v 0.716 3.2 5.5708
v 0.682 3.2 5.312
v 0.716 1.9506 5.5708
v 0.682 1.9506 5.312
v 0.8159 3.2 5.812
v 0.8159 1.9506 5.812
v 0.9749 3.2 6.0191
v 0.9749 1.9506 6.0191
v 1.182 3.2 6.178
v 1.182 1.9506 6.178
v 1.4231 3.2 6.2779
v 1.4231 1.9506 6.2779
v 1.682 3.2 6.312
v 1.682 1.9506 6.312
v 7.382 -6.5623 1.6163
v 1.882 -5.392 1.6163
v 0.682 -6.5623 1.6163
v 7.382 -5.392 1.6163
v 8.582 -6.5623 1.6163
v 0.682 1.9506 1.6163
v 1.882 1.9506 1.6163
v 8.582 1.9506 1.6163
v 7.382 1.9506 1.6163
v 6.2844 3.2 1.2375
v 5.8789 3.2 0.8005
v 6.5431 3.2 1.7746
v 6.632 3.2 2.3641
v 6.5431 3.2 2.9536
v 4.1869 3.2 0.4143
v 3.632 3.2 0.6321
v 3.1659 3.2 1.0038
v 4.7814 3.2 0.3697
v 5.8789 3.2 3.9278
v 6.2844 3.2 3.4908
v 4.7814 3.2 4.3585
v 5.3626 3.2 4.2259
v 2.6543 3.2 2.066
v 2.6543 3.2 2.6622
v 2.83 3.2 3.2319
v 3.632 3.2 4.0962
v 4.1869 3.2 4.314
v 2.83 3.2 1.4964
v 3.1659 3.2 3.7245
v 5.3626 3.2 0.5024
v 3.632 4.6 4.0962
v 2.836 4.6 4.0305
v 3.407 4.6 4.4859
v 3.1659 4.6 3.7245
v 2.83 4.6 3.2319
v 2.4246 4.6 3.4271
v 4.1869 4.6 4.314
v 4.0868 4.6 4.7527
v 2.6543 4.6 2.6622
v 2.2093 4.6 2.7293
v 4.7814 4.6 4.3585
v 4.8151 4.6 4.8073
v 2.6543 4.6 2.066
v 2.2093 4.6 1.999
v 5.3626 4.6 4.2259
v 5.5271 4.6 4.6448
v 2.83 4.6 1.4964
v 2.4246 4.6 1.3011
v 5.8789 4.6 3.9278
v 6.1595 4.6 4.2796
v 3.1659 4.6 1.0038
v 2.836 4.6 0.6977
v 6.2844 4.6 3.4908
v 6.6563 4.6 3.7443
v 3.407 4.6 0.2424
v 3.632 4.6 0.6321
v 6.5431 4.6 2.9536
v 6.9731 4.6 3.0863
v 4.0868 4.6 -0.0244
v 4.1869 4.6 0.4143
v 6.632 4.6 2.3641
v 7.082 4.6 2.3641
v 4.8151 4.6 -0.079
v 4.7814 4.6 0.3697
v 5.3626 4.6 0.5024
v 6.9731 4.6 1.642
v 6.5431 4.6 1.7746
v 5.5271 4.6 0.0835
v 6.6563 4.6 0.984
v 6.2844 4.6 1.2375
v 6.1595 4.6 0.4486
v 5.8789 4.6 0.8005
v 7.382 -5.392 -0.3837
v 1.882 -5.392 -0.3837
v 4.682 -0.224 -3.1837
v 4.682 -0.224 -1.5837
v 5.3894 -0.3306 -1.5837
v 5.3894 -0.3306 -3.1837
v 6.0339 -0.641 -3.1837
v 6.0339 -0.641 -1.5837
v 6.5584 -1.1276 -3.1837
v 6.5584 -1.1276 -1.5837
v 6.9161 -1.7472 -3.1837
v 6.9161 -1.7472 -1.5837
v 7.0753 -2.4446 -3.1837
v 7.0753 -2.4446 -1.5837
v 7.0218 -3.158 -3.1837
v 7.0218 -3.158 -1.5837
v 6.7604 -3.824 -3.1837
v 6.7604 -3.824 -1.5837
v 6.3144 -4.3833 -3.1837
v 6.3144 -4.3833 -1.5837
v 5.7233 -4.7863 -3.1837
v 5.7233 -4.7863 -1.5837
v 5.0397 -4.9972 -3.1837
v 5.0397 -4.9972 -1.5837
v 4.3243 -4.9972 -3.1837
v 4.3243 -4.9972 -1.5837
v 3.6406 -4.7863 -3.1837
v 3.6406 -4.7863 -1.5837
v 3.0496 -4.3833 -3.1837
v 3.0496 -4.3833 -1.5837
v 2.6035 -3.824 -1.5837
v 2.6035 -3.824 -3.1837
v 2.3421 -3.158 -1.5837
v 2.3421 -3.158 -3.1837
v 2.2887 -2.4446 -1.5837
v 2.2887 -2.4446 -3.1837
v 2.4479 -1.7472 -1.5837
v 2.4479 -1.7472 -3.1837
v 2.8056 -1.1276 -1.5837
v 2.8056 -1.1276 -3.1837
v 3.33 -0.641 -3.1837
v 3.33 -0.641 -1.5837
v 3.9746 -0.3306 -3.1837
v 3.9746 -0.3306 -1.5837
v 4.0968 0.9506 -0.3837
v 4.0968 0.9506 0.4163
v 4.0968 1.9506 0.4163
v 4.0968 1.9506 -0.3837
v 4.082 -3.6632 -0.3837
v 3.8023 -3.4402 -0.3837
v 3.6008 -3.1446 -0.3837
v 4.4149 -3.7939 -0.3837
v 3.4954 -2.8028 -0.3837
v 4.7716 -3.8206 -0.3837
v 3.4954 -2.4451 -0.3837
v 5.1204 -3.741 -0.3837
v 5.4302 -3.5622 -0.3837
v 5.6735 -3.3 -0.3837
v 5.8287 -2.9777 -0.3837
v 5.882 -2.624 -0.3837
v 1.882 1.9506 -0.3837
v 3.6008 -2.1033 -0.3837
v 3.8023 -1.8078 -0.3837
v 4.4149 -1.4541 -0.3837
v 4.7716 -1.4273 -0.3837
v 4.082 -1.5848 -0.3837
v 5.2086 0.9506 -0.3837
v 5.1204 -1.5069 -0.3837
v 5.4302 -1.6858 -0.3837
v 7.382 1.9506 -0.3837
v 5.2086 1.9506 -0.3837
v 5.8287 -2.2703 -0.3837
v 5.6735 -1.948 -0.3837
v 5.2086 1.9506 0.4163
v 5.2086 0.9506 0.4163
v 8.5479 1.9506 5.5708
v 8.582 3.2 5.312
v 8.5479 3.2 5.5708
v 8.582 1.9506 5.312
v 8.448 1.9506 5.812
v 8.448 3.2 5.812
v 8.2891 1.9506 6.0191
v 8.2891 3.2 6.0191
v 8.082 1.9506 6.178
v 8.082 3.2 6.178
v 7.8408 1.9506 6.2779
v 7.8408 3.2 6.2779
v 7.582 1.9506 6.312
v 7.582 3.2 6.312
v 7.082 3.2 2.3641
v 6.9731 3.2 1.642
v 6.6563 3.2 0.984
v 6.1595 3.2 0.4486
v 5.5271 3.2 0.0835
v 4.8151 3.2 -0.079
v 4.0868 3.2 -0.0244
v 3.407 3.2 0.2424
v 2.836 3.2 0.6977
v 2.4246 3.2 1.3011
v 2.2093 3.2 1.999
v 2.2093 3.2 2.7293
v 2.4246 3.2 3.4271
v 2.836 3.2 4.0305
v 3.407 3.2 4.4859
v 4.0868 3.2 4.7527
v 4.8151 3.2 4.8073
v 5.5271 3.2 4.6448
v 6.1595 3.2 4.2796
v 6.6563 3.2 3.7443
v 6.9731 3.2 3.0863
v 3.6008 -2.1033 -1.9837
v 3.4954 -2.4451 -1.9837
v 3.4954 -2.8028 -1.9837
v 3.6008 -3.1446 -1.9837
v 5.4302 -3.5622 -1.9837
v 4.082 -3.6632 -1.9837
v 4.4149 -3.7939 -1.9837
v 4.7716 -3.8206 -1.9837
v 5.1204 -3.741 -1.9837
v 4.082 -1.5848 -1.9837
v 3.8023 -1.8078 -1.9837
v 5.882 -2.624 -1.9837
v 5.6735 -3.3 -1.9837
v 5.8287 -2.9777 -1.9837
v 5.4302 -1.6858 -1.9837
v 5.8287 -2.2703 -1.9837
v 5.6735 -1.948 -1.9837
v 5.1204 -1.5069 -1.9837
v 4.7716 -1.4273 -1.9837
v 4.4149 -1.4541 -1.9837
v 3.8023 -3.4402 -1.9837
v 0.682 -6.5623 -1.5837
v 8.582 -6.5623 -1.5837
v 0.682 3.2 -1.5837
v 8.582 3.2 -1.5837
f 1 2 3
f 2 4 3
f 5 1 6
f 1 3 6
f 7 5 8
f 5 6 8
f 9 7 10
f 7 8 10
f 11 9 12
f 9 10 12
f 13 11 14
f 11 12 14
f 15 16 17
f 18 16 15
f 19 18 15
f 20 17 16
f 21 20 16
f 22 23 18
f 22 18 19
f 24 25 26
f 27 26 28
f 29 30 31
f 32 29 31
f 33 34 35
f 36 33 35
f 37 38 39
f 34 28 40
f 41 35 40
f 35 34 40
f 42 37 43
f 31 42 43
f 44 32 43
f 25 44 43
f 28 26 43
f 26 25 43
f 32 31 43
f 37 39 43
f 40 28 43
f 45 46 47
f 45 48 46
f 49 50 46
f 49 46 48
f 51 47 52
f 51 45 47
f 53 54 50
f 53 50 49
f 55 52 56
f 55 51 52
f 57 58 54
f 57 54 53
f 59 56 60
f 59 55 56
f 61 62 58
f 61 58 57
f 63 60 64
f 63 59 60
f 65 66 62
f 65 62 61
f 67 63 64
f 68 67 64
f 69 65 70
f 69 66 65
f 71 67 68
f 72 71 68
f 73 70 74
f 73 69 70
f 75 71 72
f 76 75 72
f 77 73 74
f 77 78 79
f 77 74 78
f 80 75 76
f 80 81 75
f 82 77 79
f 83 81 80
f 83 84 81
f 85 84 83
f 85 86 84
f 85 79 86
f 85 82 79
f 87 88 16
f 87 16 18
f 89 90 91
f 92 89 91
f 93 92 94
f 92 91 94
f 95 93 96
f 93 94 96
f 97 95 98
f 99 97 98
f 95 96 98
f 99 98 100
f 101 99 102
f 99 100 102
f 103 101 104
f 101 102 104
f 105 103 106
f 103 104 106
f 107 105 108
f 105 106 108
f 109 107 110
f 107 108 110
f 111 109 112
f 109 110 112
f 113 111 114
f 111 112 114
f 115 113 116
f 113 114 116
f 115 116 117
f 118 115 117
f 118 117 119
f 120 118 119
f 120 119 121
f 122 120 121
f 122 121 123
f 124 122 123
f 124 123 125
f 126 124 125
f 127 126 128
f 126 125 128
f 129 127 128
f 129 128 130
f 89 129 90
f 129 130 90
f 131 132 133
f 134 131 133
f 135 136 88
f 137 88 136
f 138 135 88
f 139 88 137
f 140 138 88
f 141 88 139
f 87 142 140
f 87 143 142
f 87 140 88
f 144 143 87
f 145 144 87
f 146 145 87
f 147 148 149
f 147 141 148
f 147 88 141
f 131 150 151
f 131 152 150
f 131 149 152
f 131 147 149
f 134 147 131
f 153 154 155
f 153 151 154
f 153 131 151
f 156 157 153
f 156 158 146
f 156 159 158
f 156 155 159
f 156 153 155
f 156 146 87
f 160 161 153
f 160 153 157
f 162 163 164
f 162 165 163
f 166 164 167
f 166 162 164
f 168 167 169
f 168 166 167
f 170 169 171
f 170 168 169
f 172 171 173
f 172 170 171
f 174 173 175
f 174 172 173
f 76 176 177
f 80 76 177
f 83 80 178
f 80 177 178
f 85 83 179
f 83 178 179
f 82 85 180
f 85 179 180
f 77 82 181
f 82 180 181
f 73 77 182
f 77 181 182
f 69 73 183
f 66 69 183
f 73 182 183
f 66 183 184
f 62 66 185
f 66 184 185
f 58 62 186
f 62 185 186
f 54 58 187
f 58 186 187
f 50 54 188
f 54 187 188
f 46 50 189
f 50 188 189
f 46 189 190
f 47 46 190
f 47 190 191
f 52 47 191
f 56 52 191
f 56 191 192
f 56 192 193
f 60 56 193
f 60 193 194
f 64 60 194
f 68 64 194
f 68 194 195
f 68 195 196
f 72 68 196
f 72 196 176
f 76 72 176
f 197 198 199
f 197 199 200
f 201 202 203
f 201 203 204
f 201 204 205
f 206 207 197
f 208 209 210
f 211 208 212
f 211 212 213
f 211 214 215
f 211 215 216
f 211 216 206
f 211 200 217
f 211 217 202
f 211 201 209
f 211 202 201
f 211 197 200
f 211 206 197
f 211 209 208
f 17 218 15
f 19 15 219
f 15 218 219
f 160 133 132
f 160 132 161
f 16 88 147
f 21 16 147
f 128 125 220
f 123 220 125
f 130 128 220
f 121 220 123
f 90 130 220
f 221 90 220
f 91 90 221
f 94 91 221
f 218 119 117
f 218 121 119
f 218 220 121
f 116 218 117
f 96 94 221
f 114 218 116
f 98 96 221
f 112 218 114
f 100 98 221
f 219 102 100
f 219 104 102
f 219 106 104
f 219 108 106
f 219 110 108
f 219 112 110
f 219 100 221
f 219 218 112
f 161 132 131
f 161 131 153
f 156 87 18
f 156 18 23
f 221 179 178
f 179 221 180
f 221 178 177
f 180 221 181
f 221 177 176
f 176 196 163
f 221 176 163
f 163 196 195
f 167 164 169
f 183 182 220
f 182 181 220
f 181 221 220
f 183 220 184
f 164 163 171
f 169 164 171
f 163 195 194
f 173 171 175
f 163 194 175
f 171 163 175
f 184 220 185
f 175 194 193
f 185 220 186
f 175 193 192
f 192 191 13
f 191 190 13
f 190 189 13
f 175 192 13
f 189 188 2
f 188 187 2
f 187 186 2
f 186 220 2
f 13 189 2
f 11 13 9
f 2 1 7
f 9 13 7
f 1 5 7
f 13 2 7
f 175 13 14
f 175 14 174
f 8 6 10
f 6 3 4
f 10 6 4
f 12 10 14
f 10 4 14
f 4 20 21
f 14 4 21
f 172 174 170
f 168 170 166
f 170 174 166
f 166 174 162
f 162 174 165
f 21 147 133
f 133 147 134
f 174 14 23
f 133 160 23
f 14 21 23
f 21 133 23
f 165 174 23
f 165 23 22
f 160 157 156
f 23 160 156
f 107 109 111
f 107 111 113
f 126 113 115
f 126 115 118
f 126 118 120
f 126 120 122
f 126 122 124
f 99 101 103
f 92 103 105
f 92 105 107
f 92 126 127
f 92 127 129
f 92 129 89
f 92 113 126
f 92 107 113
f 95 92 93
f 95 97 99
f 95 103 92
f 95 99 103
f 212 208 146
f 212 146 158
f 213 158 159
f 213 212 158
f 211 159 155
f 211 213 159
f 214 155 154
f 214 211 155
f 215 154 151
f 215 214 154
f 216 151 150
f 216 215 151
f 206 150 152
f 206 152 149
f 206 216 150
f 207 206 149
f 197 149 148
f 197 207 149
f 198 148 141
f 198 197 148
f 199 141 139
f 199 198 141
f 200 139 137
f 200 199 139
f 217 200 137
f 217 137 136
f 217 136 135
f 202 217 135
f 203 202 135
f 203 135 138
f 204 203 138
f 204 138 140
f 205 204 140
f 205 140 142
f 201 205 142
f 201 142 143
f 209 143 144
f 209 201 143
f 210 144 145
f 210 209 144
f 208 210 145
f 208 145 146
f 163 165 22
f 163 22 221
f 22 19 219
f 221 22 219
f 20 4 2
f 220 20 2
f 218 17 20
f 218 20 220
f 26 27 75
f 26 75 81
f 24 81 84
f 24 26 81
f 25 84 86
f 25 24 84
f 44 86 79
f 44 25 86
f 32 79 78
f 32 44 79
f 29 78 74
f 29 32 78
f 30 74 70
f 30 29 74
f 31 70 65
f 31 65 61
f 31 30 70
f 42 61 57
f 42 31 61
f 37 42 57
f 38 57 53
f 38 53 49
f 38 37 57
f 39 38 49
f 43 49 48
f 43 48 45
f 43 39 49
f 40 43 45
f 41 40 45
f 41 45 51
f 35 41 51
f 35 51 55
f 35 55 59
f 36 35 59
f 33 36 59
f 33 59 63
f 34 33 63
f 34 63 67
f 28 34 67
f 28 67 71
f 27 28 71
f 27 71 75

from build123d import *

# Parameters (mm, degrees)
MAINBASESKETCH_W             = 15.8
MAINBASESKETCH_H             = 3.2
MAINBASEEXTRUDE_DEPTH        = 7.9
STUDSSKETCH_R                = 2.4
STUDSEXTRUDE_DEPTH           = 1.6
STUDSPATTERN_COUNT           = 2
STUDSPATTERN_PITCH           = 8
STUDSPATTERN_COUNT_DIR2      = 2
STUDSPATTERN_PITCH_DIR2      = 8
LCUTBLUE_DEPTH               = 19.555463972
LCUTBLUE_DEPTH_BACK          = 19.555463972
MADESLIMCUTSKETCH_W          = 7.9
MADESLIMCUTSKETCH_H          = 7.9
MADESLIMCUT_DEPTH            = 19.897228453
SHORTLEXTENSIONSKETCH_W      = 1.583745828
SHORTLEXTENSIONSKETCH_H      = 7.9
SHORTLUPPERCIRCLES_START     = -0.2
SHORTLUPPERCIRCLESSKETCH_R   = 2.45
SHORTLUPPERCIRCLESSKETCH_R_2 = 2
SHORTLUPPERCIRCLES_DEPTH     = 1.6
CUT_EXTRUDE17_DEPTH          = 7.9
SKETCH63_W                   = 1.583745828
SKETCH63_H                   = 7.9
LPATTERN2_START              = -2.983745828
LPATTERN2_OUTLINE_R          = 2.45
LPATTERN2_OUTLINE_R_2        = 2
LPATTERN2_DEPTH              = 1.4
FILLET4_R                    = 1
REMOVEDMATERIAL_DEPTH        = 21.328098686
REMOVEDMATERIAL_DEPTH_BACK   = 21.328098686
SKETCH114_W                  = 7.9
SKETCH114_H                  = 7.87601279
FILLET20_R                   = 1
BOSS_EXTRUDE7_START          = -0.2
SKETCH117_R                  = 2.45
SKETCH117_R_2                = 2
BOSS_EXTRUDE7_DEPTH          = 1.6
SKETCH118_W                  = 1.583745828
SKETCH118_H                  = 4.72398721
CUT_EXTRUDE43_DEPTH          = 14.697064405
SKETCH120_R                  = 2.45
SKETCH120_R_2                = 2
CUT_EXTRUDE44_DEPTH          = 1.6
SKETCH123_W                  = 4.8
SKETCH123_H                  = 1.6
SKETCH123_W_2                = 1.4
SKETCH123_H_2                = 4.9
CUT_EXTRUDE45_DEPTH          = 14.697064405
SKETCH124_R                  = 2.4
BOSS_EXTRUDE11_DEPTH         = 1.6
SKETCH125_W                  = 7.9
SKETCH125_H                  = 1.588006001
CUT_EXTRUDE46_DEPTH          = 17.118413467
BOSS_EXTRUDE12_START         = -0.2
SKETCH126_R                  = 2.45
SKETCH126_R_2                = 2
BOSS_EXTRUDE12_DEPTH         = 1.6
SKETCH128_W                  = 6.311993999
SKETCH128_H                  = 1.950598033
CUT_EXTRUDE47_DEPTH          = 13.846822236
SKETCH129_W                  = 1.616254172
SKETCH129_H                  = 9.874585243
FILLET23_R                   = 1
SHELL8_START                 = -0.383745828
SHELL8_OUTLINE_W             = 5.5
SHELL8_OUTLINE_H             = 8.72398721
SHELL8_DEPTH                 = 2
SHELL8_START_2               = -1.983745828
SHELL8_2_OUTLINE_R           = 1.2
SHELL8_2_DEPTH               = 1.6
BOSS_EXTRUDE13_START         = -7.92398721
BOSS_EXTRUDE13_OUTLINE_W     = 7.9
BOSS_EXTRUDE13_OUTLINE_H     = 3.2
BOSS_EXTRUDE13_DEPTH         = 1
SWEEP22_START                = 1.950598033
SWEEP22_OUTLINE_W            = 5.5
SWEEP22_OUTLINE_H            = 2
SWEEP22_DEPTH                = 0.049401967
BOSS_EXTRUDE14_REACH         = 15.829
BOSS_EXTRUDE14_START         = -1.2
SKETCH133_W                  = 1.111883757
SKETCH133_H                  = 1
SKETCH136_W                  = 7.9
SKETCH136_H                  = 1.361659972
CUT_EXTRUDE48_DEPTH          = 15.099022731
SWEEP23_START                = -0.383745828
SWEEP23_OUTLINE_W            = 5.5
SWEEP23_OUTLINE_H            = 1.170292465
SWEEP23_DEPTH                = 2


# Read off the part's stored shape, not the designer's step: LPattern2, Shell8, Boss-Extrude13, Sweep22, Sweep23
with BuildPart() as part:
    # MainBaseSketch → MainBaseExtrude (new, symmetric)
    with BuildSketch(Plane.XY):
        with Locations((8.581967213, 1.6)):
            Rectangle(MAINBASESKETCH_W, MAINBASESKETCH_H)
    extrude(amount=MAINBASEEXTRUDE_DEPTH, both=True)

    # StudsSketch → StudsExtrude (add)
    with BuildSketch(Plane(origin=(0, 3.2, 0), x_dir=(1, 0, 0), z_dir=(0, 1, 0))):
        with Locations((4.581967213, 4)):
            Circle(STUDSSKETCH_R)
    studsextrude = extrude(amount=STUDSEXTRUDE_DEPTH)

    # StudsPattern: StudsExtrude 2 × 2
    with Locations(*[(j * STUDSPATTERN_PITCH_DIR2, 0, i * STUDSPATTERN_PITCH) for i in range(STUDSPATTERN_COUNT) for j in range(STUDSPATTERN_COUNT_DIR2) if (i, j) != (0, 0)]):
        add(studsextrude)

    # LCUTBlueSketch → LCutBlue (cut, two sides: drawn at the far end of the back side and taken through both)
    with BuildSketch(Plane(origin=(0, 3.2, 0), x_dir=(1, 0, 0), z_dir=(0, 1, 0)).offset(-LCUTBLUE_DEPTH_BACK)):
        Polygon((8.581967213, 53.229874044), (8.581967213, 7.9), (8.581967213, 0), (16.481967213, 0), (61.811841258, 0), (125.917963912, 64.106122654), (72.688089868, 117.335996699), align=None)
    extrude(amount=LCUTBLUE_DEPTH + LCUTBLUE_DEPTH_BACK, mode=Mode.SUBTRACT)

    # MadeSlimCutSketch → MadeSlimCut (cut, through all)
    with BuildSketch(Plane.XZ):
        with Locations((4.631967213, -3.95)):
            Rectangle(MADESLIMCUTSKETCH_W, MADESLIMCUTSKETCH_H)
    extrude(amount=-MADESLIMCUT_DEPTH, mode=Mode.SUBTRACT)

    # ShortLExtension: sweep along a curve in space
    with BuildLine() as shortlextension_path:
        Line((0.681967213, 3.2, 0), (16.481967213, 3.2, 0))
    # ShortLExtensionSketch → ShortLExtension (sweep)
    with BuildSketch(Plane(origin=(16.481967213, 0, 0), x_dir=(0, 0, -1), z_dir=(1, 0, 0))):
        with Locations((0.791872914, 3.95)):
            Rectangle(SHORTLEXTENSIONSKETCH_W, SHORTLEXTENSIONSKETCH_H)
    sweep(path=shortlextension_path.line)

    # ShortLUpperCirclesSketch → ShortLUpperCircles (add)
    # profile 1 of 2: a face of its own
    with BuildSketch(Plane(origin=(0, 0, -1.583745828), x_dir=(-1, 0, 0), z_dir=(0, 0, -1)).offset(SHORTLUPPERCIRCLES_START)):
        with Locations(Location((-12.581967213, 3.95, 0), (0, 0, 90))):
            Circle(SHORTLUPPERCIRCLESSKETCH_R)
        with Locations(Location((-12.581967213, 3.95, 0), (0, 0, 90))):
            Circle(SHORTLUPPERCIRCLESSKETCH_R_2, mode=Mode.SUBTRACT)
    # profile 2 of 2: a face of its own
    with BuildSketch(Plane(origin=(0, 0, -1.583745828), x_dir=(-1, 0, 0), z_dir=(0, 0, -1)).offset(SHORTLUPPERCIRCLES_START)):
        with Locations(Location((-4.581967213, 3.95, 0), (0, 0, 270))):
            Circle(SHORTLUPPERCIRCLESSKETCH_R)
        with Locations(Location((-4.581967213, 3.95, 0), (0, 0, 270))):
            Circle(SHORTLUPPERCIRCLESSKETCH_R_2, mode=Mode.SUBTRACT)
    extrude(amount=SHORTLUPPERCIRCLES_DEPTH)

    # Sketch59 → Cut-Extrude17 (cut)
    with BuildSketch(Plane.ZY.offset(-8.581967213)):
        Polygon((-1.583745828, 6.4), (-1.583745828, 7.9), (0, 7.9), (0, 3.2), (1.6, 3.2), (1.6, 4.8), (6.4, 4.8), (6.4, 3.2), (7.9, 3.2), (7.9, 0), (-1.583745828, 0), (-1.583745828, 1.5), (-2.983745828, 1.5), (-2.983745828, 6.4), align=None)
    extrude(amount=-CUT_EXTRUDE17_DEPTH, mode=Mode.SUBTRACT)

    # Sweep5: sweep along a curve in space
    with BuildLine() as sweep5_path:
        Line((0.681967213, 7.9, 0), (8.581967213, 7.9, 0))
    # Sketch63 → Sweep5 (sweep)
    with BuildSketch(Plane.ZY.offset(-0.681967213)):
        with Locations((-0.791872914, 11.85)):
            Rectangle(SKETCH63_W, SKETCH63_H)
    sweep(path=sweep5_path.line)

    # LPattern2 outline → LPattern2 (add)
    with BuildSketch(Plane.XY.offset(LPATTERN2_START)):
        with Locations((4.581967213, 11.95)):
            Circle(LPATTERN2_OUTLINE_R)
        with Locations((4.581967213, 11.95)):
            Circle(LPATTERN2_OUTLINE_R_2, mode=Mode.SUBTRACT)
    extrude(amount=LPATTERN2_DEPTH)

    # Fillet4
    fillet4_edges = [part.edges().sort_by_distance(p)[0] for p in [
        (0.681967213, 15.8, -0.791872914),
        (8.581967213, 15.8, -0.791872914),
    ]]
    fillet(fillet4_edges, radius=FILLET4_R)

    # Sketch114 → RemovedMaterial (cut, two sides: drawn at the far end of the back side and taken through both)
    with BuildSketch(Plane(origin=(0, 0, -1.583745828), x_dir=(-1, 0, 0), z_dir=(0, 0, -1)).offset(-REMOVEDMATERIAL_DEPTH_BACK)):
        with Locations((-4.631967213, 11.861993605)):
            Rectangle(SKETCH114_W, SKETCH114_H)
    extrude(amount=REMOVEDMATERIAL_DEPTH + REMOVEDMATERIAL_DEPTH_BACK, mode=Mode.SUBTRACT)

    # Fillet20
    fillet20_edges = [part.edges().sort_by_distance(p)[0] for p in [
        (8.581967213, 7.92398721, -0.791872914),
        (0.681967213, 7.92398721, -0.791872914),
    ]]
    fillet(fillet20_edges, radius=FILLET20_R)

    # Sweep20: sweep along a curve in space
    with BuildLine() as sweep20_path:
        Line((0.681967213, 6.92398721, 0), (0.681967213, 6.92398721, -1.583745828))
    # Sketch115 → Sweep20 (sweep)
    with BuildSketch(Plane(origin=(0, 0, -1.583745828), x_dir=(-1, 0, 0), z_dir=(0, 0, -1))):
        with BuildLine():
            Line((-8.581967213, -6.92398721), (-8.581967213, 0))
            Line((-8.581967213, 0), (-0.681967213, 0))
            Line((-0.681967213, 0), (-0.681967213, -6.92398721))
            ThreePointArc((-0.681967213, -6.92398721), (-0.974860432, -7.631093991), (-1.681967213, -7.92398721))
            Line((-1.681967213, -7.92398721), (-7.581967213, -7.92398721))
            ThreePointArc((-7.581967213, -7.92398721), (-8.289073994, -7.631093991), (-8.581967213, -6.92398721))
        make_face()
    sweep(path=sweep20_path.line)

    # Sketch117 → Boss-Extrude7 (add)
    with BuildSketch(Plane(origin=(0, 0, -1.583745828), x_dir=(-1, 0, 0), z_dir=(0, 0, -1)).offset(BOSS_EXTRUDE7_START)):
        with Locations(Location((-4.631967213, -3.961993605, 0), (0, 0, 90))):
            Circle(SKETCH117_R)
        with Locations(Location((-4.631967213, -3.961993605, 0), (0, 0, 90))):
            Circle(SKETCH117_R_2, mode=Mode.SUBTRACT)
    extrude(amount=BOSS_EXTRUDE7_DEPTH)

    # Sketch118 → Cut-Extrude43 (cut, through all)
    with BuildSketch(Plane.ZY.offset(-0.681967213)):
        with Locations((-0.791872914, 5.561993605)):
            Rectangle(SKETCH118_W, SKETCH118_H)
    extrude(amount=-CUT_EXTRUDE43_DEPTH, mode=Mode.SUBTRACT)

    # Sketch120 → Cut-Extrude44 (cut)
    with BuildSketch(Plane(origin=(0, 0, -1.583745828), x_dir=(-1, 0, 0), z_dir=(0, 0, -1))):
        with Locations((-4.581967213, 3.95)):
            Circle(SKETCH120_R)
        with Locations((-4.581967213, 3.95)):
            Circle(SKETCH120_R_2, mode=Mode.SUBTRACT)
    extrude(amount=CUT_EXTRUDE44_DEPTH, mode=Mode.SUBTRACT)

    # Sketch123 → Cut-Extrude45 (cut, through all)
    with BuildSketch(Plane.ZY.offset(-0.681967213)):
        with Locations((4, 4)):
            Rectangle(SKETCH123_W, SKETCH123_H)
        with Locations((-2.283745828, -3.961993605)):
            Rectangle(SKETCH123_W_2, SKETCH123_H_2)
    extrude(amount=-CUT_EXTRUDE45_DEPTH, mode=Mode.SUBTRACT)

    # Sketch124 → Boss-Extrude11 (add)
    with BuildSketch(Plane(origin=(0, 0, -1.583745828), x_dir=(-1, 0, 0), z_dir=(0, 0, -1))):
        with Locations(Location((-4.681967213, -2.62398721, 0), (0, 0, 90))):
            Circle(SKETCH124_R)
    extrude(amount=BOSS_EXTRUDE11_DEPTH)

    # Sketch125 → Cut-Extrude46 (cut, through all)
    with BuildSketch(Plane(origin=(0, 3.2, 0), x_dir=(1, 0, 0), z_dir=(0, 1, 0))):
        with Locations((4.631967213, -7.105997)):
            Rectangle(SKETCH125_W, SKETCH125_H)
    extrude(amount=-CUT_EXTRUDE46_DEPTH, mode=Mode.SUBTRACT)

    # Sketch126 → Boss-Extrude12 (add)
    with BuildSketch(Plane(origin=(0, 3.2, 0), x_dir=(1, 0, 0), z_dir=(0, 1, 0)).offset(BOSS_EXTRUDE12_START)):
        with Locations((4.631967213, -2.364124086)):
            Circle(SKETCH126_R)
        with Locations((4.631967213, -2.364124086)):
            Circle(SKETCH126_R_2, mode=Mode.SUBTRACT)
    extrude(amount=BOSS_EXTRUDE12_DEPTH)

    # Sketch128 → Cut-Extrude47 (cut, through all)
    with BuildSketch(Plane.ZY.offset(-0.681967213)):
        with Locations((3.155997, 0.975299017)):
            Rectangle(SKETCH128_W, SKETCH128_H)
    extrude(amount=-CUT_EXTRUDE47_DEPTH, mode=Mode.SUBTRACT)

    # Sweep21: sweep along a curve in space
    with BuildLine() as sweep21_path:
        Line((8.581967213, 1.950598033, 0), (0.681967213, 1.950598033, 0))
    # Sketch129 → Sweep21 (sweep)
    with BuildSketch(Plane.ZY.offset(-0.681967213)):
        with Locations((0.808127086, -2.986694589)):
            Rectangle(SKETCH129_W, SKETCH129_H)
    sweep(path=sweep21_path.line)

    # Fillet23
    fillet23_edges = [part.edges().sort_by_distance(p)[0] for p in [
        (8.581967213, 2.575299016, 6.311993999),
        (0.681967213, 2.575299016, 6.311993999),
        (0.681967213, -7.92398721, 0.808127086),
        (8.581967213, -7.92398721, 0.808127086),
    ]]
    fillet(fillet23_edges, radius=FILLET23_R)

    # Shell8 outline → Shell8 (cut)
    with BuildSketch(Plane.XY.offset(SHELL8_START)):
        with Locations((4.631967213, -2.361993605)):
            Rectangle(SHELL8_OUTLINE_W, SHELL8_OUTLINE_H)
    extrude(amount=SHELL8_DEPTH, mode=Mode.SUBTRACT)

    # Shell8 2 outline → Shell8 2 (cut)
    with BuildSketch(Plane.XY.offset(SHELL8_START_2)):
        with Locations((4.681967213, -2.62398721)):
            Circle(SHELL8_2_OUTLINE_R)
    extrude(amount=SHELL8_2_DEPTH, mode=Mode.SUBTRACT)

    # Boss-Extrude13 outline → Boss-Extrude13 (add)
    with BuildSketch(Plane(origin=(0, 0, 0), x_dir=(1, 0, 0), z_dir=(0, 1, 0)).offset(BOSS_EXTRUDE13_START)):
        with Locations((4.631967213, -0.016254172)):
            Rectangle(BOSS_EXTRUDE13_OUTLINE_W, BOSS_EXTRUDE13_OUTLINE_H)
    extrude(amount=BOSS_EXTRUDE13_DEPTH)

    # Sweep22 outline → Sweep22 (add)
    with BuildSketch(Plane(origin=(0, 0, 0), x_dir=(1, 0, 0), z_dir=(0, 1, 0)).offset(SWEEP22_START)):
        with Locations((4.631967213, -0.616254172)):
            Rectangle(SWEEP22_OUTLINE_W, SWEEP22_OUTLINE_H)
    extrude(amount=SWEEP22_DEPTH)

    # Sketch133 → Boss-Extrude14 (add, up to next)
    with BuildSketch(Plane.XY.offset(1.616254172).offset(BOSS_EXTRUDE14_START), mode=Mode.PRIVATE) as boss_extrude14_sk1:
        with Locations((4.652702787, 1.450598033)):
            Rectangle(SKETCH133_W, SKETCH133_H)
    boss_extrude14_tool1 = extrude(boss_extrude14_sk1.sketch, amount=-BOSS_EXTRUDE14_REACH, mode=Mode.PRIVATE) - part.part
    add(boss_extrude14_tool1.solids().sort_by_distance((4.652703, 1.450598, 0.416254))[0])

    # Sketch136 → Cut-Extrude48 (cut, through all)
    with BuildSketch(Plane(origin=(0, 0, -1.583745828), x_dir=(-1, 0, 0), z_dir=(0, 0, -1))):
        with Locations((-4.631967213, -7.243157224)):
            Rectangle(SKETCH136_W, SKETCH136_H)
    extrude(amount=-CUT_EXTRUDE48_DEPTH, mode=Mode.SUBTRACT)

    # Sweep23 outline → Sweep23 (add)
    with BuildSketch(Plane.XY.offset(SWEEP23_START)):
        with Locations((4.631967213, -5.977181006)):
            Rectangle(SWEEP23_OUTLINE_W, SWEEP23_OUTLINE_H)
    extrude(amount=SWEEP23_DEPTH)


solid = part.part
